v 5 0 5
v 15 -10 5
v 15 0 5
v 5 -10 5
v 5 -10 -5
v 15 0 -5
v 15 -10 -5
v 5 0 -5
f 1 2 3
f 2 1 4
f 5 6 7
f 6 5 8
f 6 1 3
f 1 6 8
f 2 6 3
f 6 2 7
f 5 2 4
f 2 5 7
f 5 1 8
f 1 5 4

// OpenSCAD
mirror([ 0, 1, 0 ])
translate([5, 0, -5])
	cube(size=[10, 10, 10], center=false);
